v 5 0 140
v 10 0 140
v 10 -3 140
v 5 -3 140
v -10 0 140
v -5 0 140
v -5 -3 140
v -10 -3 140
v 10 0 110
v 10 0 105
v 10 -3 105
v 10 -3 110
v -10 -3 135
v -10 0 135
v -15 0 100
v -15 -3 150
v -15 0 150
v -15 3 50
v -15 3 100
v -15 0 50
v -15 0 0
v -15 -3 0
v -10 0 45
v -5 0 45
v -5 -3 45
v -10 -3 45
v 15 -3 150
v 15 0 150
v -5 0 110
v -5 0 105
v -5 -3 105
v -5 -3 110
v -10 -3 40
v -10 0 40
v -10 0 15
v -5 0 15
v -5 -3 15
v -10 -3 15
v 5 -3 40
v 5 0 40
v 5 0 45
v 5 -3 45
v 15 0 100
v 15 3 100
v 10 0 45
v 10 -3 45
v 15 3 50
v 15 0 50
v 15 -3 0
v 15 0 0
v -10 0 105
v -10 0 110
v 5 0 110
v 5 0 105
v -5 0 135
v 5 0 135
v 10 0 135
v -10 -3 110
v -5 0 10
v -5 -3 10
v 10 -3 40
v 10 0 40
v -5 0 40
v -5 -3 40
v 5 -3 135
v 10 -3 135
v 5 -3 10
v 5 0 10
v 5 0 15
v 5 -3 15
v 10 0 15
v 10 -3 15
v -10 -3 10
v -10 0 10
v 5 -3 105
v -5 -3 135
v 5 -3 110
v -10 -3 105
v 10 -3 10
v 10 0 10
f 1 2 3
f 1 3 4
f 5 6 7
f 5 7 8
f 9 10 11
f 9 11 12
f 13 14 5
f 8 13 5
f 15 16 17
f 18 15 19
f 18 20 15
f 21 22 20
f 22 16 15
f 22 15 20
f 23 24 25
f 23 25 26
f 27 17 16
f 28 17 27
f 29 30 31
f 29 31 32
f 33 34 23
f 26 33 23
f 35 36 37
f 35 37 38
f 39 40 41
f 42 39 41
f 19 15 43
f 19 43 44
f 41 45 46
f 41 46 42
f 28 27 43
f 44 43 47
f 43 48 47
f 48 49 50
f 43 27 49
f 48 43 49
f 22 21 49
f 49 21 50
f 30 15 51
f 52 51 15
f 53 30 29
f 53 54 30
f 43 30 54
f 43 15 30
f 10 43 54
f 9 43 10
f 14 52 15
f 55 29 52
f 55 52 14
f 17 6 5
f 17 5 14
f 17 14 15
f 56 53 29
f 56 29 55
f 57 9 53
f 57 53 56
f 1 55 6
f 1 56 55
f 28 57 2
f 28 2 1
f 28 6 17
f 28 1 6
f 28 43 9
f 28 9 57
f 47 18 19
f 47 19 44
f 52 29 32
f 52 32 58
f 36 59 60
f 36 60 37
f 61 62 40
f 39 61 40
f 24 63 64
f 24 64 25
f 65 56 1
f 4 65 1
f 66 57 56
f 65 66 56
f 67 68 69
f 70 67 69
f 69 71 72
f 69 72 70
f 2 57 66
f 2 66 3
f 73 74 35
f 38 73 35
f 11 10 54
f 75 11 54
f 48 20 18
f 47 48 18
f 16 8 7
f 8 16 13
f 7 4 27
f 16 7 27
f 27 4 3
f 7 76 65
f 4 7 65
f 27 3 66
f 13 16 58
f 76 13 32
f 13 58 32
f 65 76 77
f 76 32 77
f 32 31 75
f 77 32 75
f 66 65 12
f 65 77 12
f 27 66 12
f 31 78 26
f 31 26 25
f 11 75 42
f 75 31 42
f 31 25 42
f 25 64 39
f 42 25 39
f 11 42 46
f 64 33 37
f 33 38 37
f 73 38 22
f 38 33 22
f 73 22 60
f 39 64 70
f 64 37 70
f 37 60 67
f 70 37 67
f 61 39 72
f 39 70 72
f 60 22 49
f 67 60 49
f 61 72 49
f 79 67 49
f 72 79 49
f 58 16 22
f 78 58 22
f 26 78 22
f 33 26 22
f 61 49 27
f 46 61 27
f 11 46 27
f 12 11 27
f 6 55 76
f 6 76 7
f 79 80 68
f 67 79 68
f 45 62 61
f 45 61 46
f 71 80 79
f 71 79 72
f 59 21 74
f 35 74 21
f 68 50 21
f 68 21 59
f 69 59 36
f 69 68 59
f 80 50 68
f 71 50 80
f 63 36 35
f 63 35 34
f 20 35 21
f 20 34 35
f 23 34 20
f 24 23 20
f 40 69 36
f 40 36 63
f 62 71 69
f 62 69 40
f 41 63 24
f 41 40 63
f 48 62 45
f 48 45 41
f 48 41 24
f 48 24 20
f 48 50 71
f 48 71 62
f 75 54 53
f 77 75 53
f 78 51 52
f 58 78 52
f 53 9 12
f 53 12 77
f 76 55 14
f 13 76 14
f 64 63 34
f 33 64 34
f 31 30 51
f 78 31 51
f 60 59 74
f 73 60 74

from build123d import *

# Parameters (mm, degrees)
F0_W     = 30
F0_H     = 6
F1_DEPTH = 150
F2_W     = 3
F2_H     = 50
F3_DEPTH = 30
F4_W     = 5
F4_H     = 5
F5_DEPTH = 3


with BuildPart() as f1:
    # F0 (on Top) → F1 (new body)
    with BuildSketch(Plane.XY):
        Rectangle(F0_W, F0_H)
    extrude(amount=F1_DEPTH)

    # F2 (on face) → F3 (cut, through all)
    with BuildSketch(Plane.YZ.offset(15)):
        with Locations((1.5, 125)):
            Rectangle(F2_W, F2_H)
        with Locations((1.5, 25)):
            Rectangle(F2_W, F2_H)
    extrude(amount=-F3_DEPTH, mode=Mode.SUBTRACT)

    # F4 (on face) → F5 (cut, through all)
    with BuildSketch(Plane(origin=(0, 0, 0), x_dir=(-1, 0, 0), z_dir=(0, 1, 0))):
        with Locations((7.5, 12.5)):
            Rectangle(F4_W, F4_H)
        with Locations((-7.5, 12.5)):
            Rectangle(F4_W, F4_H)
        with Locations((-7.5, 42.5)):
            Rectangle(F4_W, F4_H)
        with Locations((7.5, 42.5)):
            Rectangle(F4_W, F4_H)
        with Locations((7.5, 107.5)):
            Rectangle(F4_W, F4_H)
        with Locations((-7.5, 107.5)):
            Rectangle(F4_W, F4_H)
        with Locations((-7.5, 137.5)):
            Rectangle(F4_W, F4_H)
        with Locations((7.5, 137.5)):
            Rectangle(F4_W, F4_H)
    extrude(amount=-F5_DEPTH, mode=Mode.SUBTRACT)


solid = f1.part
